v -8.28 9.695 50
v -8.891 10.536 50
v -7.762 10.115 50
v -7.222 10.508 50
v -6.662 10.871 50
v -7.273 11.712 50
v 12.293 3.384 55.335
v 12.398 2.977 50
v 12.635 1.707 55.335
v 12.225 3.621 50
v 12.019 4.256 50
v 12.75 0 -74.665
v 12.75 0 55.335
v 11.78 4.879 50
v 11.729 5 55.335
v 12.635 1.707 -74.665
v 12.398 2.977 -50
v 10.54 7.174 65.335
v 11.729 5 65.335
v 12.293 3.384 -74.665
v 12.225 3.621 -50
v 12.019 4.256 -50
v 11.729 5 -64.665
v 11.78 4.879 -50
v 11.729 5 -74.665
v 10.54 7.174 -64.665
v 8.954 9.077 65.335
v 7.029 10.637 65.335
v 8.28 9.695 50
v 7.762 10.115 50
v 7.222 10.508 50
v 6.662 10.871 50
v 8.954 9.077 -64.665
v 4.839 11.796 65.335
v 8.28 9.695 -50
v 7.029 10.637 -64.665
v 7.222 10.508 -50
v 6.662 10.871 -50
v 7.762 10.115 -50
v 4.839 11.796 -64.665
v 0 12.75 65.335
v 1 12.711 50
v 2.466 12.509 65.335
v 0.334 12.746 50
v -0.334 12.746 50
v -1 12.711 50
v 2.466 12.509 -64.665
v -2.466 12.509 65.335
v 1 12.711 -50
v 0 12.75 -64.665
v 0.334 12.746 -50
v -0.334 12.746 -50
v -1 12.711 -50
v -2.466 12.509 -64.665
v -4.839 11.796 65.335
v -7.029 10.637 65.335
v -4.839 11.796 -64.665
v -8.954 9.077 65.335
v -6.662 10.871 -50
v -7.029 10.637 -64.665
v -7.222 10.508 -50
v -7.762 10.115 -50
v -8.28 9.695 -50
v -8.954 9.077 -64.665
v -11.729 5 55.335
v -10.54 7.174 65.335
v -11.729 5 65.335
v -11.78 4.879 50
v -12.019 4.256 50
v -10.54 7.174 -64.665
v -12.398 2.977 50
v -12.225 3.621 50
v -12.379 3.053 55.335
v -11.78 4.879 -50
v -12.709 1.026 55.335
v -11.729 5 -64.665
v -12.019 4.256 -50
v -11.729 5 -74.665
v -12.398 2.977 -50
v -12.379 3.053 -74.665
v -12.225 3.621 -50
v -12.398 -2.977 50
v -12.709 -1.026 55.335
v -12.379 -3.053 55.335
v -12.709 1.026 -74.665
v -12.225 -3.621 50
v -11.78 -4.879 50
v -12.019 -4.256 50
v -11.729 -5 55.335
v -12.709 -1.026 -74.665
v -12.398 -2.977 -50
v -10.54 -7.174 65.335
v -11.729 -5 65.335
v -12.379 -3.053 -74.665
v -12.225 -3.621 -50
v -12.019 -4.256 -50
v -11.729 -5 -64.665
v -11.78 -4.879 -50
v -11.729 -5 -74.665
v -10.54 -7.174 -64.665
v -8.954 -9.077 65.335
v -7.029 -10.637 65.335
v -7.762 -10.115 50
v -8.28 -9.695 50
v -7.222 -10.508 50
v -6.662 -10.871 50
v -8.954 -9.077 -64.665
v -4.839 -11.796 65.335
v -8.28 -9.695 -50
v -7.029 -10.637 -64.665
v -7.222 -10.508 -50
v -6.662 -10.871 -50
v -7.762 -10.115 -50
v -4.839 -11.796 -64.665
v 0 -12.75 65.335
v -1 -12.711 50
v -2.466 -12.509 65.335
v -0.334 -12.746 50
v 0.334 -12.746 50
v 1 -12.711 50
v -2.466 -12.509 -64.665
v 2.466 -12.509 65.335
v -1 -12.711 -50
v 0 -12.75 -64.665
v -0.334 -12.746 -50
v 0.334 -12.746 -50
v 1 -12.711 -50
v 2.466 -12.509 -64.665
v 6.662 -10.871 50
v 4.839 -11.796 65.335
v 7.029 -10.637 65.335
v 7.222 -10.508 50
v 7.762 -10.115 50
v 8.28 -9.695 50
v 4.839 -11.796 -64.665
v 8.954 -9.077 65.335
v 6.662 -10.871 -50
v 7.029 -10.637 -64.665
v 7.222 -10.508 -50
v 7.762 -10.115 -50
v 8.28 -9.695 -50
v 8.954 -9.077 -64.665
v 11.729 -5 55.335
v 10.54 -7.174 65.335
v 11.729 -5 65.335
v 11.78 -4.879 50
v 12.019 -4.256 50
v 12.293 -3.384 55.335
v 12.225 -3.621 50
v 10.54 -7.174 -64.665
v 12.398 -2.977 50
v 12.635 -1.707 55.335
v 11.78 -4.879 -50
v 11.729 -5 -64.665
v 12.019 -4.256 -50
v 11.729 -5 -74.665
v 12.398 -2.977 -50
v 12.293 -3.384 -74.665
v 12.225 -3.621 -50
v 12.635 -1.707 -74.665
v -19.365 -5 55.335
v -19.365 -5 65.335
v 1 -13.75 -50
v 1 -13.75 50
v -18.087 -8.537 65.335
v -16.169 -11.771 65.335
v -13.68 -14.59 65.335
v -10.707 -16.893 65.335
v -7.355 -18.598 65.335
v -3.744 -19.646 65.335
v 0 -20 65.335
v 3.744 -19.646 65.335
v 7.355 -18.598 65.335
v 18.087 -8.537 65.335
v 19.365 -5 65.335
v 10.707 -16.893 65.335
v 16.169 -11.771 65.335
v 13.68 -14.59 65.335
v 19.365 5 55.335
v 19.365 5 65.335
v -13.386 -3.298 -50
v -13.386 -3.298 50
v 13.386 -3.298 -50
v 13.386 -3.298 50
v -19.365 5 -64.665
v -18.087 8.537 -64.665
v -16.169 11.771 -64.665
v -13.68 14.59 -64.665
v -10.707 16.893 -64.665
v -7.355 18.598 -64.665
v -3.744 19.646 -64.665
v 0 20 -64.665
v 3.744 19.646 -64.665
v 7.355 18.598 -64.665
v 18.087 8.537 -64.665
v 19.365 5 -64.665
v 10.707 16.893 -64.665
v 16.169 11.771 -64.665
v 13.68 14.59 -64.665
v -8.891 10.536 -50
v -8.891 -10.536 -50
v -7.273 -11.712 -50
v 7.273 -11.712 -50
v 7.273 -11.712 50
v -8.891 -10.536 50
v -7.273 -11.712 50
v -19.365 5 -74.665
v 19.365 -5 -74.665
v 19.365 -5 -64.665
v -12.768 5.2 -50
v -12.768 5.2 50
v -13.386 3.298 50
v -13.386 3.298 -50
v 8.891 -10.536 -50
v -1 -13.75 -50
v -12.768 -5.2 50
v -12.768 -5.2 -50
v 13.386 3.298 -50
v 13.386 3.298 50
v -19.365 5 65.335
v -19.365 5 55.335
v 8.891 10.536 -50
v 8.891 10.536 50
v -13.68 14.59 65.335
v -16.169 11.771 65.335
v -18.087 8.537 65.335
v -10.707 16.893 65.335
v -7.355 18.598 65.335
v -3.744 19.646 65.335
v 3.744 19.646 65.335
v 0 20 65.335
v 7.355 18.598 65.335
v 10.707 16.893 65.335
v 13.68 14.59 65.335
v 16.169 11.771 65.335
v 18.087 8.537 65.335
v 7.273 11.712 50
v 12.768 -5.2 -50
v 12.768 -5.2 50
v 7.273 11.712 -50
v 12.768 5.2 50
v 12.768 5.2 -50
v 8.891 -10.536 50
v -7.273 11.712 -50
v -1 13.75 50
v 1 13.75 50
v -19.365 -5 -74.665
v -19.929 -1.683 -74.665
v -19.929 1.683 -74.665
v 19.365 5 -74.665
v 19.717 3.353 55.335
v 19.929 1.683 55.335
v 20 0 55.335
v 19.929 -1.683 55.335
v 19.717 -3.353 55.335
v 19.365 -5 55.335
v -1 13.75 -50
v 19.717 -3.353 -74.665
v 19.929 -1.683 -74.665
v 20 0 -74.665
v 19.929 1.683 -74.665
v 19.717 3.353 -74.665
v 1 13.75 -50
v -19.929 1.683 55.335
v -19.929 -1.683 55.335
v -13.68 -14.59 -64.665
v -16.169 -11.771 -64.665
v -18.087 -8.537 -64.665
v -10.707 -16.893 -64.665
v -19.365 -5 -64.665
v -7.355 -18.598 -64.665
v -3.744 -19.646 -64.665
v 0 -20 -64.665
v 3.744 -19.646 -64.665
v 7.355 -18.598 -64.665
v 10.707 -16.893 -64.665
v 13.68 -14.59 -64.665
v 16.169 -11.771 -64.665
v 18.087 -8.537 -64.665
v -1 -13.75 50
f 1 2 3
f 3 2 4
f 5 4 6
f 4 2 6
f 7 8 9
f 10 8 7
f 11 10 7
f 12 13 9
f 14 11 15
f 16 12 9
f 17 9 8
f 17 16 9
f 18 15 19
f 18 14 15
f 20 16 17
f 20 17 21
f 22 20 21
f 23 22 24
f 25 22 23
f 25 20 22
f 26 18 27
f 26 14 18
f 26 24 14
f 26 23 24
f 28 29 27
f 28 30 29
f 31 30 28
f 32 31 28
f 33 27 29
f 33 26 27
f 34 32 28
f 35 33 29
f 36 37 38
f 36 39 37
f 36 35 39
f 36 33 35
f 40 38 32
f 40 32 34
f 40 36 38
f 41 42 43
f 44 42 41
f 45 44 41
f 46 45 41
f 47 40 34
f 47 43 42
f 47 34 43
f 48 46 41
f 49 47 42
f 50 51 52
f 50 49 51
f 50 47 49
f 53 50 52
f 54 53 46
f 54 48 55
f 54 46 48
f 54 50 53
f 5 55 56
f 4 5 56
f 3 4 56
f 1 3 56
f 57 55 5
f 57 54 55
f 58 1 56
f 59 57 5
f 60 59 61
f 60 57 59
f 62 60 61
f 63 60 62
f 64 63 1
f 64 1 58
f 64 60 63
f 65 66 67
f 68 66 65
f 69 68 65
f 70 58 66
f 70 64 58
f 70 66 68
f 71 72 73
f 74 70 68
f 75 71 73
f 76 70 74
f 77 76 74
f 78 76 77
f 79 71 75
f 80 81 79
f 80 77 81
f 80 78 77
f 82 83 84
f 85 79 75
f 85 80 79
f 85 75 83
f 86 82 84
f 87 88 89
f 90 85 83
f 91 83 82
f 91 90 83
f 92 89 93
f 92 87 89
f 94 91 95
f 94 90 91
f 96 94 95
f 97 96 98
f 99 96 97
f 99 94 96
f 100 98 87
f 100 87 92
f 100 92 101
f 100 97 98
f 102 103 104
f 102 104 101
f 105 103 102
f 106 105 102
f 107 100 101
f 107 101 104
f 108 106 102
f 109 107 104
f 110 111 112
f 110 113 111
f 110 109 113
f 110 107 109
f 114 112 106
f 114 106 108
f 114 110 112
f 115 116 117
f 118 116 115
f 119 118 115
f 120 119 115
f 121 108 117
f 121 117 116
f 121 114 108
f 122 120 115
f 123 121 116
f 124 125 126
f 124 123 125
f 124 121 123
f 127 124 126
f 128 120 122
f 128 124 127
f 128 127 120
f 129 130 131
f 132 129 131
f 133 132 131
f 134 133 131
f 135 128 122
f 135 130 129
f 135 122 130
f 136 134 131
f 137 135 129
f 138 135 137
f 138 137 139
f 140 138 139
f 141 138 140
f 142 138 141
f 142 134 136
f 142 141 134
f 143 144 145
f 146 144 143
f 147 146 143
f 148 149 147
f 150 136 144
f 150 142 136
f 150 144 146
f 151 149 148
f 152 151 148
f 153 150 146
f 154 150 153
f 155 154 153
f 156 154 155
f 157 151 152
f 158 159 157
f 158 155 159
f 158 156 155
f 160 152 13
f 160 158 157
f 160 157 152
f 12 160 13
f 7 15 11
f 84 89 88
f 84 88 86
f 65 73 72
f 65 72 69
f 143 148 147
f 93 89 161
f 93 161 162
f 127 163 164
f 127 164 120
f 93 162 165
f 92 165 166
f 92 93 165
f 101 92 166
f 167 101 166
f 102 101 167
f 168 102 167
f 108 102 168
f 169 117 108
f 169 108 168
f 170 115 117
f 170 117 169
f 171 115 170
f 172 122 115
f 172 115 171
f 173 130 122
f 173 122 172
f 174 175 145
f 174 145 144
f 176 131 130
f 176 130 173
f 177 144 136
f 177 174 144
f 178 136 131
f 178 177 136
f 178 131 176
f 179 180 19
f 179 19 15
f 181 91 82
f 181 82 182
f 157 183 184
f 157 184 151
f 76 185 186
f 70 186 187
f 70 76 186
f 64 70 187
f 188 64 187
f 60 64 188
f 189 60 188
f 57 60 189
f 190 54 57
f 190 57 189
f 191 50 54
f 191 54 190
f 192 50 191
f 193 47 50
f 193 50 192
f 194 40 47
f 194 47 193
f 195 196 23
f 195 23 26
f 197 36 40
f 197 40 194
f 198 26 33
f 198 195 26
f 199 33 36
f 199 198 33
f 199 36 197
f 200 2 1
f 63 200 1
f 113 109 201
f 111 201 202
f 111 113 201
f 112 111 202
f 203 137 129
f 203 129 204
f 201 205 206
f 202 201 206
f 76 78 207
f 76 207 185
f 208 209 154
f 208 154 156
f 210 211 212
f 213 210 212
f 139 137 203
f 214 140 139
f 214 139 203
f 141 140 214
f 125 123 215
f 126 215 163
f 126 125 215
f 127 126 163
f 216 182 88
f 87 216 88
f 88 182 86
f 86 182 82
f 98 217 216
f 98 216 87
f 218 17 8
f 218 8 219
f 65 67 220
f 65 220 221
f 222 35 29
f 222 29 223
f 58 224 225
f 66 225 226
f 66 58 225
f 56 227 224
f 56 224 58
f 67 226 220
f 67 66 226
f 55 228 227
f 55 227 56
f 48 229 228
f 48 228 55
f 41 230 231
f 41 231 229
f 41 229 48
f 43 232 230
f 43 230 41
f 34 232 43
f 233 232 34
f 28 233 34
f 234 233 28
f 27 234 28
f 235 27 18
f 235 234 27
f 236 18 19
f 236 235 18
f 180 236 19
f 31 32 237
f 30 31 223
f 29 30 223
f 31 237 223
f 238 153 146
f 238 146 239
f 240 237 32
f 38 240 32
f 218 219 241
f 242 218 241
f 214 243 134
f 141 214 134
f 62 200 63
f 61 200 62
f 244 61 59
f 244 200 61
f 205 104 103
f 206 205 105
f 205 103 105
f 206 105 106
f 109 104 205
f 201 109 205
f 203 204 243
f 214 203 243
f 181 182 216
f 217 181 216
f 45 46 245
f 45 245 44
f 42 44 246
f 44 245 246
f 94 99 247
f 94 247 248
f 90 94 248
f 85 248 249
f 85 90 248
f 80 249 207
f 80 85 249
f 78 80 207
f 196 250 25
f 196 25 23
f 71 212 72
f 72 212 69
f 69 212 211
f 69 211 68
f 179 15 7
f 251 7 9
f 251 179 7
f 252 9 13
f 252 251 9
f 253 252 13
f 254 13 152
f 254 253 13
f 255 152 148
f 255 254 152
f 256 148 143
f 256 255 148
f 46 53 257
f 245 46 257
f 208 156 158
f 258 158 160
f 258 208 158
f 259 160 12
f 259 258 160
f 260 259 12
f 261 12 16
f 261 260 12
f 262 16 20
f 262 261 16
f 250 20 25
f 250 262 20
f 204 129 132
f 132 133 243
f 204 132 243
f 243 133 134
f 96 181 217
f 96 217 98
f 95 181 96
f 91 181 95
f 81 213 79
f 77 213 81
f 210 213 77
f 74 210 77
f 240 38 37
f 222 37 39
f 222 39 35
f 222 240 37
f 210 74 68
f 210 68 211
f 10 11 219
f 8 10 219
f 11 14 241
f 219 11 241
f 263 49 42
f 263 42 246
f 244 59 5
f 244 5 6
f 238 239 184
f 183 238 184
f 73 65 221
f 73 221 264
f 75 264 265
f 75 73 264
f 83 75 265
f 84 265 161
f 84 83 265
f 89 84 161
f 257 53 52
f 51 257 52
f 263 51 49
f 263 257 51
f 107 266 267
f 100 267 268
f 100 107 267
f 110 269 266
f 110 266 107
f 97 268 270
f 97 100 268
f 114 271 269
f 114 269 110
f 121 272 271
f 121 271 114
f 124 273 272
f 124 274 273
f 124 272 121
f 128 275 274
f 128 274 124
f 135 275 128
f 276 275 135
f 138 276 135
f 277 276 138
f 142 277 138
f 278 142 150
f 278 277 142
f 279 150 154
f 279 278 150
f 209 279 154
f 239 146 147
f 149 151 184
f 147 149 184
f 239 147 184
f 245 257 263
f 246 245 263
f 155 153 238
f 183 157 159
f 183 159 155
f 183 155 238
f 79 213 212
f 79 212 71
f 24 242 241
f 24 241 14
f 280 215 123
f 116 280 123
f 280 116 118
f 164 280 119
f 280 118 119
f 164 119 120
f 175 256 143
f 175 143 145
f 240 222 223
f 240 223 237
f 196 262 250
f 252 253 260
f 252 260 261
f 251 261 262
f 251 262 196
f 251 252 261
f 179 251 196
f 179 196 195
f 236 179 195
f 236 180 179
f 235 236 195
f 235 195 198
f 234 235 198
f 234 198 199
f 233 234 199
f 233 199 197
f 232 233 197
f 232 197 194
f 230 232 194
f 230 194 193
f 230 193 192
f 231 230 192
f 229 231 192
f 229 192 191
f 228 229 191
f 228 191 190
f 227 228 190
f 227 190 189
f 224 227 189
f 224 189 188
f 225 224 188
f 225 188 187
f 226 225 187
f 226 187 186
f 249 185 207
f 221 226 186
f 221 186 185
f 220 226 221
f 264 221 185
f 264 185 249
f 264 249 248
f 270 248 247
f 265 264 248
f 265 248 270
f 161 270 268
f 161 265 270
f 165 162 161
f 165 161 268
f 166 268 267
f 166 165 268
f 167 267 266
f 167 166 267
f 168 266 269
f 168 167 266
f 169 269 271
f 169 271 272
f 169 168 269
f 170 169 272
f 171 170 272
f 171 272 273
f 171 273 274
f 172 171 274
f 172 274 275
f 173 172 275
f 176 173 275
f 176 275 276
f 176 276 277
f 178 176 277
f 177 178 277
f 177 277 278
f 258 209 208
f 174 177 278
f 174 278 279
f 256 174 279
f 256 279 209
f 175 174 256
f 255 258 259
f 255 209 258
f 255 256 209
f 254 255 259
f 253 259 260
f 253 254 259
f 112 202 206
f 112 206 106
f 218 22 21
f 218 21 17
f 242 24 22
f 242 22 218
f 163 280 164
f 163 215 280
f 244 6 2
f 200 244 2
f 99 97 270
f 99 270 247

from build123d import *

# Parameters (mm, degrees)
F0_R     = 20
F0_R_2   = 12.75
F1_DEPTH = 100
F3_DEPTH = 25
F4_W     = 2
F4_H     = 2
F5_DEPTH = 50


with BuildPart() as f1:
    # F0 (on Top) → F1 (new body, symmetric)
    with BuildSketch(Plane.XY):
        Circle(F0_R)
        Circle(F0_R_2, mode=Mode.SUBTRACT)
    extrude(amount=F1_DEPTH, both=True)

    # F2 (on Right) → F3 (intersect, symmetric)
    with BuildSketch(Plane.YZ):
        Polygon((-5, 65.33519), (-30, 65.33519), (-30, -64.66481), (-5, -64.66481), (-5, -74.66481), (5, -74.66481), (5, -64.66481), (30, -64.66481), (30, 65.33519), (5, 65.33519), (5, 55.33519), (-5, 55.33519), align=None)
    extrude(amount=F3_DEPTH, both=True, mode=Mode.INTERSECT)

    # F4 (on Top) → F5 (cut, symmetric)
    with BuildSketch(Plane.XY):
        with Locations((0, 12.75)):
            Rectangle(F4_W, F4_H)
        Polygon((-6.09746, 10.093735), (-7.27303, 11.711769), (-8.891064, 10.536198), (-7.715494, 8.918164), align=None)
        Polygon((-10.865897, 4.582006), (-12.76801, 5.20004), (-13.386044, 3.297927), (-11.483931, 2.679893), align=None)
        Polygon((-11.483931, -2.679893), (-13.386044, -3.297927), (-12.76801, -5.20004), (-10.865897, -4.582006), align=None)
        Polygon((-7.715494, -8.918164), (-8.891064, -10.536198), (-7.27303, -11.711769), (-6.09746, -10.093735), align=None)
        with Locations((0, -12.75)):
            Rectangle(F4_W, F4_H)
        Polygon((6.09746, -10.093735), (7.27303, -11.711769), (8.891064, -10.536198), (7.715494, -8.918164), align=None)
        Polygon((10.865897, -4.582006), (12.76801, -5.20004), (13.386044, -3.297927), (11.483931, -2.679893), align=None)
        Polygon((11.483931, 2.679893), (13.386044, 3.297927), (12.76801, 5.20004), (10.865897, 4.582006), align=None)
        Polygon((7.715494, 8.918164), (8.891064, 10.536198), (7.27303, 11.711769), (6.09746, 10.093735), align=None)
    extrude(amount=F5_DEPTH, both=True, mode=Mode.SUBTRACT)


solid = f1.part
